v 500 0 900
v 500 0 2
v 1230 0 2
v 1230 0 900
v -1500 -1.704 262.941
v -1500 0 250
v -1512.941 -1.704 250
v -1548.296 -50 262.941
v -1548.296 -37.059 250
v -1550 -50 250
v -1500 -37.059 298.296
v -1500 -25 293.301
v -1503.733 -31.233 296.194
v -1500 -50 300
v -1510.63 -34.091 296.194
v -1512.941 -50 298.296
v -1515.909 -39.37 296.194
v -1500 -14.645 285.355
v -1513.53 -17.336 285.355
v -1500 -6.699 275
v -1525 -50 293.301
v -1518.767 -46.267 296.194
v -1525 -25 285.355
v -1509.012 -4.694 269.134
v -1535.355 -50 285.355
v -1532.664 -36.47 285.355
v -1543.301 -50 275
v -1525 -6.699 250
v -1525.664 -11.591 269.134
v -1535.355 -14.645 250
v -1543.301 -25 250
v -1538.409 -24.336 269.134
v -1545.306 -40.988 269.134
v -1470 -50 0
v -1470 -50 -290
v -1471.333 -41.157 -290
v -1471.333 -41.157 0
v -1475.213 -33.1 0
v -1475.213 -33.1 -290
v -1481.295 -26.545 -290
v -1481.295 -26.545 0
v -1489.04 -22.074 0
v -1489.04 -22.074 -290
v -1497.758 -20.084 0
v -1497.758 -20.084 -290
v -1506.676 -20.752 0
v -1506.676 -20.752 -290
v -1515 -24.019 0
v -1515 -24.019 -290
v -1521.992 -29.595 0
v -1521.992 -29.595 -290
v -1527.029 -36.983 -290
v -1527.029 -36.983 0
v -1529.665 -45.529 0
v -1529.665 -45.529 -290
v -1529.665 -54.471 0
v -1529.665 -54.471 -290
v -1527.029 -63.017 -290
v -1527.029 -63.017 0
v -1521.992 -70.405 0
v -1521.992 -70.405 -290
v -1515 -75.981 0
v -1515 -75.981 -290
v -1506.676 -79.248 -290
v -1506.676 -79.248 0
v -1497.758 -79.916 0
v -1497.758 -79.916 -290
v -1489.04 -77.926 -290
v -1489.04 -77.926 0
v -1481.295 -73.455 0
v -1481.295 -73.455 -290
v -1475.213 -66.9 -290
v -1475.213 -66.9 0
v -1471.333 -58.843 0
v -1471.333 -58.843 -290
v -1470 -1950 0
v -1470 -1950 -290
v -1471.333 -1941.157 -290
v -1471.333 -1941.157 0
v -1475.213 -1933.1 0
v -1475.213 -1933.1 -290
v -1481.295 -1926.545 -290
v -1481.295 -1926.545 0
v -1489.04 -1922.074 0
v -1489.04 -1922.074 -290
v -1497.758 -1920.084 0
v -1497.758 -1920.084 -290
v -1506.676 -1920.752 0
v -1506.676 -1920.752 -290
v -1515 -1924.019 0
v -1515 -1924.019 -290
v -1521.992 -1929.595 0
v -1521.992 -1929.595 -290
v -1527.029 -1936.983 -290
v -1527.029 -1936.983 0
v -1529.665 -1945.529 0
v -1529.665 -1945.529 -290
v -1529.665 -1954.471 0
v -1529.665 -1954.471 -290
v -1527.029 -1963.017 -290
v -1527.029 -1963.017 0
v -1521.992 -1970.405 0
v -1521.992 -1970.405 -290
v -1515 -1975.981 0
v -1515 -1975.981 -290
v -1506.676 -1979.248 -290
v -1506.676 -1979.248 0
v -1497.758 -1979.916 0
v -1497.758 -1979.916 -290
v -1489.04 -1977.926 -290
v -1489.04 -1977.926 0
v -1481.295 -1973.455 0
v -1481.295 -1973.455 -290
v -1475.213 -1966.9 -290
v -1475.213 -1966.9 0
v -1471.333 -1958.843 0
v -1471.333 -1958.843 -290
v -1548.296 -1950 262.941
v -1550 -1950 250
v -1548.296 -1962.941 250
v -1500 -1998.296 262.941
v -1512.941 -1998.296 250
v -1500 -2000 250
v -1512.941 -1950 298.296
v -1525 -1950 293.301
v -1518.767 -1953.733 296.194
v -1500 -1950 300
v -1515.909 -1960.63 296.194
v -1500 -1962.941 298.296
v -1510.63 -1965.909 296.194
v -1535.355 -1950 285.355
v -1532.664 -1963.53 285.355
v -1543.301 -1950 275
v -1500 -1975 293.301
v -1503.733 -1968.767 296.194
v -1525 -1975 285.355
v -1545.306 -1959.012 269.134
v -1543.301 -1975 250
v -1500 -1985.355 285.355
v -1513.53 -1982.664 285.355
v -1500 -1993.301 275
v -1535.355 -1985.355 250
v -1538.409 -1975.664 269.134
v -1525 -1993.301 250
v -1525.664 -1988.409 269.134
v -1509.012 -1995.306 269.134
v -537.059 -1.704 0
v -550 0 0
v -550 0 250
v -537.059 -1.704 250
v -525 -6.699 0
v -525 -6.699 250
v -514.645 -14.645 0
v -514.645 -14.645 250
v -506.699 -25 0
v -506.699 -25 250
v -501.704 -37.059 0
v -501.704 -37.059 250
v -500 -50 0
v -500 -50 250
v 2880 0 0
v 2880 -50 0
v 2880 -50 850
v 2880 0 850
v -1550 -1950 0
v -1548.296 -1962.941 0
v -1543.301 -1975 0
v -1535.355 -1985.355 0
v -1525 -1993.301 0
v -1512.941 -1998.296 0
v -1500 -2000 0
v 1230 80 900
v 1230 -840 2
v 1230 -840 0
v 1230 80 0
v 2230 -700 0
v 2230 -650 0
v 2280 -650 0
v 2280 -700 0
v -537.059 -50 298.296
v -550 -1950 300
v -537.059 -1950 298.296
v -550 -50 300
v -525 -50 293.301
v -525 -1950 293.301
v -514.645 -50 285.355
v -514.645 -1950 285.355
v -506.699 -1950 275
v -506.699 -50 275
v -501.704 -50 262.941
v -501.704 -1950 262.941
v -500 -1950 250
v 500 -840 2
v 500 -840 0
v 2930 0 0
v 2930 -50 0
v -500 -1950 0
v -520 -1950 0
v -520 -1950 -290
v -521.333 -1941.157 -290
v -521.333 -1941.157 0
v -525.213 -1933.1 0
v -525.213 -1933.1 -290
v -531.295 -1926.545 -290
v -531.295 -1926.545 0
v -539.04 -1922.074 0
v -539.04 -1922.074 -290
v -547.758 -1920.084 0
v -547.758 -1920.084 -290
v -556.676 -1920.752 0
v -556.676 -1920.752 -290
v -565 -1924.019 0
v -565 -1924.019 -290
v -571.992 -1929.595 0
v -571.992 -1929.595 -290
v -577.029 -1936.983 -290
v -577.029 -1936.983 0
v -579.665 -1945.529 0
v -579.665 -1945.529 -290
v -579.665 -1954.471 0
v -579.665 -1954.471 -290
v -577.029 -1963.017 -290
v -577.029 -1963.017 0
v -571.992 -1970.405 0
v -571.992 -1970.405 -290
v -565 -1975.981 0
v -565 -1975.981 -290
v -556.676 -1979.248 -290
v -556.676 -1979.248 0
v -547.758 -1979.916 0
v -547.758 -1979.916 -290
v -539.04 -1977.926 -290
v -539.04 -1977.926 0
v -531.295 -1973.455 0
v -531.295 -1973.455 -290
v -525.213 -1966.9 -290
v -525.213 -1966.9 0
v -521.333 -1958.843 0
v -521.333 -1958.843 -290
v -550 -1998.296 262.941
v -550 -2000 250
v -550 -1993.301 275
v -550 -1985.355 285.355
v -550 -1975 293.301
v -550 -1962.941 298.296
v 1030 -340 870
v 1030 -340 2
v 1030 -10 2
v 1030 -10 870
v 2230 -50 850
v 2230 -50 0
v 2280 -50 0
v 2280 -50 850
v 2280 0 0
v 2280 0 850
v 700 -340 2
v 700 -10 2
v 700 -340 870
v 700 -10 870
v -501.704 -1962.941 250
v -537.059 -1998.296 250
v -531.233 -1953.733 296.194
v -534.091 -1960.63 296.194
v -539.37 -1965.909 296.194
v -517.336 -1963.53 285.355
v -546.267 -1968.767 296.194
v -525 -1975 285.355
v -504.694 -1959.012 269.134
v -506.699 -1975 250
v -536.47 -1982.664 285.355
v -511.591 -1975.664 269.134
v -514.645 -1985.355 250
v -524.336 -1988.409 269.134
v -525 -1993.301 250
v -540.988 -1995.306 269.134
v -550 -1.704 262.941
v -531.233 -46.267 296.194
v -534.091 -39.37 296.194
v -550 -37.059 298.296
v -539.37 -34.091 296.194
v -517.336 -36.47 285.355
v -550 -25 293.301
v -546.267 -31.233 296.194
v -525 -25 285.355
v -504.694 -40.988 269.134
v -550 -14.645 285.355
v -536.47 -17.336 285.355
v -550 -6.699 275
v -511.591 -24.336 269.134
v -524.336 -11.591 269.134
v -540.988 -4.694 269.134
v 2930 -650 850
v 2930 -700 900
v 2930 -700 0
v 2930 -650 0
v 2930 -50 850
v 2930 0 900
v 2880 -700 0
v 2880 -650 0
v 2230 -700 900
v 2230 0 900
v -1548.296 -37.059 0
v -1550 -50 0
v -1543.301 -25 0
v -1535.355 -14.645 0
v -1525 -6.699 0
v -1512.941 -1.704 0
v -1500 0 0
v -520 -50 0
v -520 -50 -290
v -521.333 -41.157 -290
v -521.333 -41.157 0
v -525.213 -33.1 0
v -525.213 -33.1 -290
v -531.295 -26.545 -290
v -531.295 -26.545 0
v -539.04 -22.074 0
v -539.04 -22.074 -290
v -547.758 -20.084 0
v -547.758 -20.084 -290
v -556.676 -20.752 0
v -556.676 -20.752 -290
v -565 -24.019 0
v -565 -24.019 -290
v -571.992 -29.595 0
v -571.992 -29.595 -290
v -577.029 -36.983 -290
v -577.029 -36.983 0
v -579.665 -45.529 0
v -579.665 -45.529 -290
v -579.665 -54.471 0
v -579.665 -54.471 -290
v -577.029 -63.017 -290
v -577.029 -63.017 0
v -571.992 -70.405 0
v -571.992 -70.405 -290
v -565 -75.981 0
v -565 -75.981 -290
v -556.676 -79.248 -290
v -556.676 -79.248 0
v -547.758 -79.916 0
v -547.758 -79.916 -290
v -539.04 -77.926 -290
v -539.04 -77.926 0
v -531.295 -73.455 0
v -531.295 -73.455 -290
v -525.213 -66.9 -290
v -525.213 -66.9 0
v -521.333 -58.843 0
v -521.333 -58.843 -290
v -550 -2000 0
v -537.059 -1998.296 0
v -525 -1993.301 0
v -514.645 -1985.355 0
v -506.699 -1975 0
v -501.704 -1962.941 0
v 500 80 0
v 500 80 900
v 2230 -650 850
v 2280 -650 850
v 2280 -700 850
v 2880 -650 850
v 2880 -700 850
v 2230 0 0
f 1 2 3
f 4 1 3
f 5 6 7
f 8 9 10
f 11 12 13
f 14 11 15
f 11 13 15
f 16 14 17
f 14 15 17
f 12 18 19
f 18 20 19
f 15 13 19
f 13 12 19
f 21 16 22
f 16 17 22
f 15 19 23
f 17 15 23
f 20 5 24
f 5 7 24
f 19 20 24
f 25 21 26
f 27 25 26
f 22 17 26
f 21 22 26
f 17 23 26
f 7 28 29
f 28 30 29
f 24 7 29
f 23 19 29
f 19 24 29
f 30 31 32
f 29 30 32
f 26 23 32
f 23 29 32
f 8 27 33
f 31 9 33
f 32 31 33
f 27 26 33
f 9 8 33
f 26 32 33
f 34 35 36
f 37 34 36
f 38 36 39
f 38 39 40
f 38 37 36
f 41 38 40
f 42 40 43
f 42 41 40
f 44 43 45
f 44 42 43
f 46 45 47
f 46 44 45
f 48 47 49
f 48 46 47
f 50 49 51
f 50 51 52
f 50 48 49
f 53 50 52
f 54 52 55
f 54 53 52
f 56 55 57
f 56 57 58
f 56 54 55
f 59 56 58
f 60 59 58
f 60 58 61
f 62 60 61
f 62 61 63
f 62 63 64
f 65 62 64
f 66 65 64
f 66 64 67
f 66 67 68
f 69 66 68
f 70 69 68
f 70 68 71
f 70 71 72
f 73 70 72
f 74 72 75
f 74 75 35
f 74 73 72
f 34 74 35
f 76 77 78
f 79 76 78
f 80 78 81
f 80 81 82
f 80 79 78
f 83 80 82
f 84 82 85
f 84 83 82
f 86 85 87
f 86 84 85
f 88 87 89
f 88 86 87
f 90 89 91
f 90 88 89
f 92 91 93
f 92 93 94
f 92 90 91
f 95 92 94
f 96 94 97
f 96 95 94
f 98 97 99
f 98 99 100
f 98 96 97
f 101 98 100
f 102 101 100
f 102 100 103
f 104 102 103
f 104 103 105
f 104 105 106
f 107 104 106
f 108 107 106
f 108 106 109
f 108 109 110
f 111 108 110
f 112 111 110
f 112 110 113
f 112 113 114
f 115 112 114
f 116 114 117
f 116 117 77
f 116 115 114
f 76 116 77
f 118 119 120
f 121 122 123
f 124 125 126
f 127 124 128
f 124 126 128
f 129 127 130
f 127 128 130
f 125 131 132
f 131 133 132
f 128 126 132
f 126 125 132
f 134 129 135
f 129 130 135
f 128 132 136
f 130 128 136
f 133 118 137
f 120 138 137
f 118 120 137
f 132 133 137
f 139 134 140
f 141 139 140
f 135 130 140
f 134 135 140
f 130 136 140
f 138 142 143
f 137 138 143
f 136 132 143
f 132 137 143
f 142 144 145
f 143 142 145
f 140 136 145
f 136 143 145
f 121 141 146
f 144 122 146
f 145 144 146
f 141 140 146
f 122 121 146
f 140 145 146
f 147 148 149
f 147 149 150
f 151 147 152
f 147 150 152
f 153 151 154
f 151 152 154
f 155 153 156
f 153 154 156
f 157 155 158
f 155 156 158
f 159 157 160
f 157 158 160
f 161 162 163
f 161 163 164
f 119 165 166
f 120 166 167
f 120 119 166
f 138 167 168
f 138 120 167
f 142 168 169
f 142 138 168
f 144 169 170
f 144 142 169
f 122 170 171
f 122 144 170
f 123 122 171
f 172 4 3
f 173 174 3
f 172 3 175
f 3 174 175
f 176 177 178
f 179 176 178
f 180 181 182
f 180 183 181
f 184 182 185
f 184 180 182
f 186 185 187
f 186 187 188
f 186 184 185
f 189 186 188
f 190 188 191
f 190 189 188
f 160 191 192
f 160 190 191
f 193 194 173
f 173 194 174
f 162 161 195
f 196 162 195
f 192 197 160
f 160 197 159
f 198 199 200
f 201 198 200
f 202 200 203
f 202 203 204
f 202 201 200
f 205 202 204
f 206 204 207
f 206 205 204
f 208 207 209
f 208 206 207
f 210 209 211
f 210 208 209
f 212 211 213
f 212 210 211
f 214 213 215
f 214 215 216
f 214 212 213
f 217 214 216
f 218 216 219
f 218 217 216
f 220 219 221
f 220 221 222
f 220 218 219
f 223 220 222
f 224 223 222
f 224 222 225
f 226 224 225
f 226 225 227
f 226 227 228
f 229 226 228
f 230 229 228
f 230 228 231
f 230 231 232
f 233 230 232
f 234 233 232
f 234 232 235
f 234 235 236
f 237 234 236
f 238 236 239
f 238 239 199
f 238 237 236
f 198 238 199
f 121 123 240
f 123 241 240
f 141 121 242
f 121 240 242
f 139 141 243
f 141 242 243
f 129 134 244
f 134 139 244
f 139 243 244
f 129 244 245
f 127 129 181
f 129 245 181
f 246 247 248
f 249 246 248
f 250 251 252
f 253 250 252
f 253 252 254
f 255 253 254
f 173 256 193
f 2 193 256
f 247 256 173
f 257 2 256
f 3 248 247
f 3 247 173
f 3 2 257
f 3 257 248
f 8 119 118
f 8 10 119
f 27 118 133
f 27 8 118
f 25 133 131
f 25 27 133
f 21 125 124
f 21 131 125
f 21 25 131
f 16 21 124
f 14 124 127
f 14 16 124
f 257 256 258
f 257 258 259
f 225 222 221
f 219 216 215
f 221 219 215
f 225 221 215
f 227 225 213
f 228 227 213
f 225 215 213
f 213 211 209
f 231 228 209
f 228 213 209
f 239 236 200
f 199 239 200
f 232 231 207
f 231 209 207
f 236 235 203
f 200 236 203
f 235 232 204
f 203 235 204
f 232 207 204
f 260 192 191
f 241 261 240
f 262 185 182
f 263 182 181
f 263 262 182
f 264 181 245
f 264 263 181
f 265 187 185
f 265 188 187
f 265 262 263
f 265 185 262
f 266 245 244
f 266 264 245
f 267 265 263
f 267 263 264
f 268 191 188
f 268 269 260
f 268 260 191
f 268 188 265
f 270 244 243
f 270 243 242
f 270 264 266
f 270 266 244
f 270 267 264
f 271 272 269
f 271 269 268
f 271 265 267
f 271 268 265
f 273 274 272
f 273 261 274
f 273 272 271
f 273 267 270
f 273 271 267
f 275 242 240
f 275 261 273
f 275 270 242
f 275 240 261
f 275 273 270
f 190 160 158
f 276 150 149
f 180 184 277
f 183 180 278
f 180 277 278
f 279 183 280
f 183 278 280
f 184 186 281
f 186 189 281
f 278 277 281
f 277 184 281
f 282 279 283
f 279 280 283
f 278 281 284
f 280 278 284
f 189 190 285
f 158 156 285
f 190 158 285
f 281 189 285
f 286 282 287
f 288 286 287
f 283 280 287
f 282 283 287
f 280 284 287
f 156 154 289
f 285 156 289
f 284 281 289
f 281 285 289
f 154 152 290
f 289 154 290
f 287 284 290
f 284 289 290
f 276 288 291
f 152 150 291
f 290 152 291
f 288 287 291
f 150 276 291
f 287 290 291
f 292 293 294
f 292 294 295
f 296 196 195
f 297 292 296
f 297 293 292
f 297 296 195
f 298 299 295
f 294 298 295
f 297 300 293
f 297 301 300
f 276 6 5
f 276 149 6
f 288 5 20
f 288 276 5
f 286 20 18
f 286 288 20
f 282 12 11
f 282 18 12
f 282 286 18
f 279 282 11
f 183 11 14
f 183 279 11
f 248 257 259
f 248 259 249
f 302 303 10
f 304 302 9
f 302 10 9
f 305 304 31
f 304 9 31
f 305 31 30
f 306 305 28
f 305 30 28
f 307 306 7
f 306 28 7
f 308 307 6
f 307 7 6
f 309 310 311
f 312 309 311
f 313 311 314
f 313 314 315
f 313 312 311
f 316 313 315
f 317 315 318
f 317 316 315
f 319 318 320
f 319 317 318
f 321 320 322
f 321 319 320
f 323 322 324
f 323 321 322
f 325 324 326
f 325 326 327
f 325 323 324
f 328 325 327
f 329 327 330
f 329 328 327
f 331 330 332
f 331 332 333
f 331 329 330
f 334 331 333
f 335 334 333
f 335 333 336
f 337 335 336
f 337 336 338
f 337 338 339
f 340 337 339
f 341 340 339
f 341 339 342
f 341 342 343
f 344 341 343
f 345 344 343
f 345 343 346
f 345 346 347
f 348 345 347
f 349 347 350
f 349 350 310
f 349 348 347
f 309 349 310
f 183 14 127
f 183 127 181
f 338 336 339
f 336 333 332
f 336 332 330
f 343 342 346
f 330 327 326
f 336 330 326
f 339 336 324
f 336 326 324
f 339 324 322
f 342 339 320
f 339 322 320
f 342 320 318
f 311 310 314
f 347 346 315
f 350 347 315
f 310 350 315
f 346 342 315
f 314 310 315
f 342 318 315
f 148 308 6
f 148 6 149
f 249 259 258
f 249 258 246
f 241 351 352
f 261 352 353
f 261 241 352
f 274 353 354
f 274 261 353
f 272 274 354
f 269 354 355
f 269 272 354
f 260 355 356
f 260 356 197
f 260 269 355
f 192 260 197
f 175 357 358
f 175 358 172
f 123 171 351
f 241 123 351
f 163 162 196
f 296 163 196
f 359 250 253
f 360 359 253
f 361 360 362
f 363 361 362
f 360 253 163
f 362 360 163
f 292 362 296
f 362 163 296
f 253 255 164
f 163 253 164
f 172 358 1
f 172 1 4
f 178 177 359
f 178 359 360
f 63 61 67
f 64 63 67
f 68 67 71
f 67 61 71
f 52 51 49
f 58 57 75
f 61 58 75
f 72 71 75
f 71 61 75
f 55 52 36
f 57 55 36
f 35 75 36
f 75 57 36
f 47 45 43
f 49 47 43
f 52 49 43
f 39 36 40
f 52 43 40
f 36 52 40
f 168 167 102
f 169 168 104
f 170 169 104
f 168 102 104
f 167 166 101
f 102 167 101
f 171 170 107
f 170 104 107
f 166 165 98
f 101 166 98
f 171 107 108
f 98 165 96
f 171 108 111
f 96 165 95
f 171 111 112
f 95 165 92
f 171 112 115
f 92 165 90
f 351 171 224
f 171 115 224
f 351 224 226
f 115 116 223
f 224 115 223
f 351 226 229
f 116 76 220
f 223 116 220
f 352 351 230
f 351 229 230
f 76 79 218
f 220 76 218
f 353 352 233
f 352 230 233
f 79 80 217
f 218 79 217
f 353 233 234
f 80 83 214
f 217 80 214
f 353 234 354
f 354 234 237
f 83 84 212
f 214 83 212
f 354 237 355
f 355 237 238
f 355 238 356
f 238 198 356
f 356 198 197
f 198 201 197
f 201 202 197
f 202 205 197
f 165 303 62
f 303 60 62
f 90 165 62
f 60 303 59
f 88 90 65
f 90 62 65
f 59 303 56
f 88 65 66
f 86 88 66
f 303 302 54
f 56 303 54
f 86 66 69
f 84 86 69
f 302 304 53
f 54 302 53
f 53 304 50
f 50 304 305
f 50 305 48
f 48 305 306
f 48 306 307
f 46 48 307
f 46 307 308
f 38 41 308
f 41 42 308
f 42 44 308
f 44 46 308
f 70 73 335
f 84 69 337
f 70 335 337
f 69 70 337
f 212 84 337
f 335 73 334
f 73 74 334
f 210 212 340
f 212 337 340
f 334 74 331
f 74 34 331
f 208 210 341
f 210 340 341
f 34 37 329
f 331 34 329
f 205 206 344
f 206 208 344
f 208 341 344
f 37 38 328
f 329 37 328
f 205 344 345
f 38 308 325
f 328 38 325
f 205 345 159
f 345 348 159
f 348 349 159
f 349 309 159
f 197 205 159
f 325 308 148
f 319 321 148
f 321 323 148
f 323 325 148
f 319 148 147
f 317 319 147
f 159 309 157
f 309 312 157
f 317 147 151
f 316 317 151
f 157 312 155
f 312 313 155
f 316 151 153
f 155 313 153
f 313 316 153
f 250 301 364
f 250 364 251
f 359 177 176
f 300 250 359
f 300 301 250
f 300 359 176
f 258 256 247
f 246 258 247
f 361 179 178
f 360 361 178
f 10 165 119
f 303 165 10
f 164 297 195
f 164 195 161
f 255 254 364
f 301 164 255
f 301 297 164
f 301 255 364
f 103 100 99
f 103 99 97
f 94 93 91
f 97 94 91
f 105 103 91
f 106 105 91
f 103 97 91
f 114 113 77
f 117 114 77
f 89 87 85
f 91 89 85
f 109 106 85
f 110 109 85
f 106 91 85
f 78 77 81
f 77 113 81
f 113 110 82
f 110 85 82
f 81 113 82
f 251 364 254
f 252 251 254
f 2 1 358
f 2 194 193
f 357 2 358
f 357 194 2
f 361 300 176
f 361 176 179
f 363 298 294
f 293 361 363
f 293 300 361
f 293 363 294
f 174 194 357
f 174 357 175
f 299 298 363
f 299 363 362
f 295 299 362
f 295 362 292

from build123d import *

# Parameters (mm, degrees)
F0_W      = 1050
F0_H      = 2000
F0_R      = 30
F1_DEPTH  = 300
F2_DEPTH  = 290
F3_R      = 50
F0_W_2    = 330
F0_H_2    = 330
F4_DEPTH  = 870
F0_W_3    = 730
F0_H_3    = 840
F5_DEPTH  = 2
F0_H_4    = 80
F6_DEPTH  = 900
F8_W      = 50
F8_H      = 50
F9_DEPTH  = 50
F10_DEPTH = 900


with BuildPart() as f1:
    # F0 (on Top) → F1 (new body)
    with BuildSketch(Plane.XY):
        with Locations((-1025, -1000)):
            Rectangle(F0_W, F0_H)
        with Locations((-1500, -1950)):
            Circle(F0_R, mode=Mode.SUBTRACT)
        with Locations((-550, -1950)):
            Circle(F0_R, mode=Mode.SUBTRACT)
        with Locations((-1500, -50)):
            Circle(F0_R, mode=Mode.SUBTRACT)
        with Locations((-550, -50)):
            Circle(F0_R, mode=Mode.SUBTRACT)
        with Locations((-1500, -50)):
            Circle(F0_R)
        with Locations((-550, -50)):
            Circle(F0_R)
        with Locations((-550, -1950)):
            Circle(F0_R)
        with Locations((-1500, -1950)):
            Circle(F0_R)
    extrude(amount=F1_DEPTH)

    # F0 (on Top) → F2 (join)
    with BuildSketch(Plane.XY):
        with Locations((-550, -50)):
            Circle(F0_R)
        with Locations((-1500, -50)):
            Circle(F0_R)
        with Locations((-1500, -1950)):
            Circle(F0_R)
        with Locations((-550, -1950)):
            Circle(F0_R)
    extrude(amount=-F2_DEPTH)

    # F3
    f3_edges = [f1.edges().sort_by_distance(p)[0] for p in [
        (-1550, 0, 150),
        (-1550, -2000, 150),
        (-500, -2000, 150),
        (-500, 0, 150),
        (-500, -1000, 300),
        (-1025, 0, 300),
        (-1550, -1000, 300),
        (-1025, -2000, 300),
    ]]
    fillet(f3_edges, radius=F3_R)


with BuildPart() as f4:
    # F0 (on Top) → F4 (new body)
    with BuildSketch(Plane.XY):
        with Locations((865, -175)):
            Rectangle(F0_W_2, F0_H_2)
    extrude(amount=F4_DEPTH)

    # F0 (on Top) → F5 (join)
    with BuildSketch(Plane.XY):
        with Locations((865, -420)):
            Rectangle(F0_W_3, F0_H_3)
        with Locations((865, -175)):
            Rectangle(F0_W_2, F0_H_2, mode=Mode.SUBTRACT)
    extrude(amount=F5_DEPTH)

    # F0 (on Top) → F6 (join)
    with BuildSketch(Plane.XY):
        with Locations((865, 40)):
            Rectangle(F0_W_3, F0_H_4)
    extrude(amount=F6_DEPTH)


with BuildPart() as f9:
    # F8 (on offset) → F9 (new body)
    with BuildSketch(Plane.XY.offset(900)):
        Polygon((2880, 0), (2280, 0), (2280, -50), (2230, -50), (2230, -650), (2280, -650), (2280, -700), (2880, -700), (2880, -650), (2930, -650), (2930, -50), (2880, -50), align=None)
        with Locations((2255, -25)):
            Rectangle(F8_W, F8_H)
        with Locations((2905, -25)):
            Rectangle(F8_W, F8_H)
        with Locations((2905, -675)):
            Rectangle(F8_W, F8_H)
        with Locations((2255, -675)):
            Rectangle(F8_W, F8_H)
    extrude(amount=-F9_DEPTH)

    # F8 (on offset) → F10 (join, through all)
    with BuildSketch(Plane.XY.offset(900)):
        with Locations((2255, -675)):
            Rectangle(F8_W, F8_H)
        with Locations((2905, -675)):
            Rectangle(F8_W, F8_H)
        with Locations((2255, -25)):
            Rectangle(F8_W, F8_H)
        with Locations((2905, -25)):
            Rectangle(F8_W, F8_H)
    extrude(amount=-F10_DEPTH)


solid = Compound([f1.part, f4.part, f9.part])
